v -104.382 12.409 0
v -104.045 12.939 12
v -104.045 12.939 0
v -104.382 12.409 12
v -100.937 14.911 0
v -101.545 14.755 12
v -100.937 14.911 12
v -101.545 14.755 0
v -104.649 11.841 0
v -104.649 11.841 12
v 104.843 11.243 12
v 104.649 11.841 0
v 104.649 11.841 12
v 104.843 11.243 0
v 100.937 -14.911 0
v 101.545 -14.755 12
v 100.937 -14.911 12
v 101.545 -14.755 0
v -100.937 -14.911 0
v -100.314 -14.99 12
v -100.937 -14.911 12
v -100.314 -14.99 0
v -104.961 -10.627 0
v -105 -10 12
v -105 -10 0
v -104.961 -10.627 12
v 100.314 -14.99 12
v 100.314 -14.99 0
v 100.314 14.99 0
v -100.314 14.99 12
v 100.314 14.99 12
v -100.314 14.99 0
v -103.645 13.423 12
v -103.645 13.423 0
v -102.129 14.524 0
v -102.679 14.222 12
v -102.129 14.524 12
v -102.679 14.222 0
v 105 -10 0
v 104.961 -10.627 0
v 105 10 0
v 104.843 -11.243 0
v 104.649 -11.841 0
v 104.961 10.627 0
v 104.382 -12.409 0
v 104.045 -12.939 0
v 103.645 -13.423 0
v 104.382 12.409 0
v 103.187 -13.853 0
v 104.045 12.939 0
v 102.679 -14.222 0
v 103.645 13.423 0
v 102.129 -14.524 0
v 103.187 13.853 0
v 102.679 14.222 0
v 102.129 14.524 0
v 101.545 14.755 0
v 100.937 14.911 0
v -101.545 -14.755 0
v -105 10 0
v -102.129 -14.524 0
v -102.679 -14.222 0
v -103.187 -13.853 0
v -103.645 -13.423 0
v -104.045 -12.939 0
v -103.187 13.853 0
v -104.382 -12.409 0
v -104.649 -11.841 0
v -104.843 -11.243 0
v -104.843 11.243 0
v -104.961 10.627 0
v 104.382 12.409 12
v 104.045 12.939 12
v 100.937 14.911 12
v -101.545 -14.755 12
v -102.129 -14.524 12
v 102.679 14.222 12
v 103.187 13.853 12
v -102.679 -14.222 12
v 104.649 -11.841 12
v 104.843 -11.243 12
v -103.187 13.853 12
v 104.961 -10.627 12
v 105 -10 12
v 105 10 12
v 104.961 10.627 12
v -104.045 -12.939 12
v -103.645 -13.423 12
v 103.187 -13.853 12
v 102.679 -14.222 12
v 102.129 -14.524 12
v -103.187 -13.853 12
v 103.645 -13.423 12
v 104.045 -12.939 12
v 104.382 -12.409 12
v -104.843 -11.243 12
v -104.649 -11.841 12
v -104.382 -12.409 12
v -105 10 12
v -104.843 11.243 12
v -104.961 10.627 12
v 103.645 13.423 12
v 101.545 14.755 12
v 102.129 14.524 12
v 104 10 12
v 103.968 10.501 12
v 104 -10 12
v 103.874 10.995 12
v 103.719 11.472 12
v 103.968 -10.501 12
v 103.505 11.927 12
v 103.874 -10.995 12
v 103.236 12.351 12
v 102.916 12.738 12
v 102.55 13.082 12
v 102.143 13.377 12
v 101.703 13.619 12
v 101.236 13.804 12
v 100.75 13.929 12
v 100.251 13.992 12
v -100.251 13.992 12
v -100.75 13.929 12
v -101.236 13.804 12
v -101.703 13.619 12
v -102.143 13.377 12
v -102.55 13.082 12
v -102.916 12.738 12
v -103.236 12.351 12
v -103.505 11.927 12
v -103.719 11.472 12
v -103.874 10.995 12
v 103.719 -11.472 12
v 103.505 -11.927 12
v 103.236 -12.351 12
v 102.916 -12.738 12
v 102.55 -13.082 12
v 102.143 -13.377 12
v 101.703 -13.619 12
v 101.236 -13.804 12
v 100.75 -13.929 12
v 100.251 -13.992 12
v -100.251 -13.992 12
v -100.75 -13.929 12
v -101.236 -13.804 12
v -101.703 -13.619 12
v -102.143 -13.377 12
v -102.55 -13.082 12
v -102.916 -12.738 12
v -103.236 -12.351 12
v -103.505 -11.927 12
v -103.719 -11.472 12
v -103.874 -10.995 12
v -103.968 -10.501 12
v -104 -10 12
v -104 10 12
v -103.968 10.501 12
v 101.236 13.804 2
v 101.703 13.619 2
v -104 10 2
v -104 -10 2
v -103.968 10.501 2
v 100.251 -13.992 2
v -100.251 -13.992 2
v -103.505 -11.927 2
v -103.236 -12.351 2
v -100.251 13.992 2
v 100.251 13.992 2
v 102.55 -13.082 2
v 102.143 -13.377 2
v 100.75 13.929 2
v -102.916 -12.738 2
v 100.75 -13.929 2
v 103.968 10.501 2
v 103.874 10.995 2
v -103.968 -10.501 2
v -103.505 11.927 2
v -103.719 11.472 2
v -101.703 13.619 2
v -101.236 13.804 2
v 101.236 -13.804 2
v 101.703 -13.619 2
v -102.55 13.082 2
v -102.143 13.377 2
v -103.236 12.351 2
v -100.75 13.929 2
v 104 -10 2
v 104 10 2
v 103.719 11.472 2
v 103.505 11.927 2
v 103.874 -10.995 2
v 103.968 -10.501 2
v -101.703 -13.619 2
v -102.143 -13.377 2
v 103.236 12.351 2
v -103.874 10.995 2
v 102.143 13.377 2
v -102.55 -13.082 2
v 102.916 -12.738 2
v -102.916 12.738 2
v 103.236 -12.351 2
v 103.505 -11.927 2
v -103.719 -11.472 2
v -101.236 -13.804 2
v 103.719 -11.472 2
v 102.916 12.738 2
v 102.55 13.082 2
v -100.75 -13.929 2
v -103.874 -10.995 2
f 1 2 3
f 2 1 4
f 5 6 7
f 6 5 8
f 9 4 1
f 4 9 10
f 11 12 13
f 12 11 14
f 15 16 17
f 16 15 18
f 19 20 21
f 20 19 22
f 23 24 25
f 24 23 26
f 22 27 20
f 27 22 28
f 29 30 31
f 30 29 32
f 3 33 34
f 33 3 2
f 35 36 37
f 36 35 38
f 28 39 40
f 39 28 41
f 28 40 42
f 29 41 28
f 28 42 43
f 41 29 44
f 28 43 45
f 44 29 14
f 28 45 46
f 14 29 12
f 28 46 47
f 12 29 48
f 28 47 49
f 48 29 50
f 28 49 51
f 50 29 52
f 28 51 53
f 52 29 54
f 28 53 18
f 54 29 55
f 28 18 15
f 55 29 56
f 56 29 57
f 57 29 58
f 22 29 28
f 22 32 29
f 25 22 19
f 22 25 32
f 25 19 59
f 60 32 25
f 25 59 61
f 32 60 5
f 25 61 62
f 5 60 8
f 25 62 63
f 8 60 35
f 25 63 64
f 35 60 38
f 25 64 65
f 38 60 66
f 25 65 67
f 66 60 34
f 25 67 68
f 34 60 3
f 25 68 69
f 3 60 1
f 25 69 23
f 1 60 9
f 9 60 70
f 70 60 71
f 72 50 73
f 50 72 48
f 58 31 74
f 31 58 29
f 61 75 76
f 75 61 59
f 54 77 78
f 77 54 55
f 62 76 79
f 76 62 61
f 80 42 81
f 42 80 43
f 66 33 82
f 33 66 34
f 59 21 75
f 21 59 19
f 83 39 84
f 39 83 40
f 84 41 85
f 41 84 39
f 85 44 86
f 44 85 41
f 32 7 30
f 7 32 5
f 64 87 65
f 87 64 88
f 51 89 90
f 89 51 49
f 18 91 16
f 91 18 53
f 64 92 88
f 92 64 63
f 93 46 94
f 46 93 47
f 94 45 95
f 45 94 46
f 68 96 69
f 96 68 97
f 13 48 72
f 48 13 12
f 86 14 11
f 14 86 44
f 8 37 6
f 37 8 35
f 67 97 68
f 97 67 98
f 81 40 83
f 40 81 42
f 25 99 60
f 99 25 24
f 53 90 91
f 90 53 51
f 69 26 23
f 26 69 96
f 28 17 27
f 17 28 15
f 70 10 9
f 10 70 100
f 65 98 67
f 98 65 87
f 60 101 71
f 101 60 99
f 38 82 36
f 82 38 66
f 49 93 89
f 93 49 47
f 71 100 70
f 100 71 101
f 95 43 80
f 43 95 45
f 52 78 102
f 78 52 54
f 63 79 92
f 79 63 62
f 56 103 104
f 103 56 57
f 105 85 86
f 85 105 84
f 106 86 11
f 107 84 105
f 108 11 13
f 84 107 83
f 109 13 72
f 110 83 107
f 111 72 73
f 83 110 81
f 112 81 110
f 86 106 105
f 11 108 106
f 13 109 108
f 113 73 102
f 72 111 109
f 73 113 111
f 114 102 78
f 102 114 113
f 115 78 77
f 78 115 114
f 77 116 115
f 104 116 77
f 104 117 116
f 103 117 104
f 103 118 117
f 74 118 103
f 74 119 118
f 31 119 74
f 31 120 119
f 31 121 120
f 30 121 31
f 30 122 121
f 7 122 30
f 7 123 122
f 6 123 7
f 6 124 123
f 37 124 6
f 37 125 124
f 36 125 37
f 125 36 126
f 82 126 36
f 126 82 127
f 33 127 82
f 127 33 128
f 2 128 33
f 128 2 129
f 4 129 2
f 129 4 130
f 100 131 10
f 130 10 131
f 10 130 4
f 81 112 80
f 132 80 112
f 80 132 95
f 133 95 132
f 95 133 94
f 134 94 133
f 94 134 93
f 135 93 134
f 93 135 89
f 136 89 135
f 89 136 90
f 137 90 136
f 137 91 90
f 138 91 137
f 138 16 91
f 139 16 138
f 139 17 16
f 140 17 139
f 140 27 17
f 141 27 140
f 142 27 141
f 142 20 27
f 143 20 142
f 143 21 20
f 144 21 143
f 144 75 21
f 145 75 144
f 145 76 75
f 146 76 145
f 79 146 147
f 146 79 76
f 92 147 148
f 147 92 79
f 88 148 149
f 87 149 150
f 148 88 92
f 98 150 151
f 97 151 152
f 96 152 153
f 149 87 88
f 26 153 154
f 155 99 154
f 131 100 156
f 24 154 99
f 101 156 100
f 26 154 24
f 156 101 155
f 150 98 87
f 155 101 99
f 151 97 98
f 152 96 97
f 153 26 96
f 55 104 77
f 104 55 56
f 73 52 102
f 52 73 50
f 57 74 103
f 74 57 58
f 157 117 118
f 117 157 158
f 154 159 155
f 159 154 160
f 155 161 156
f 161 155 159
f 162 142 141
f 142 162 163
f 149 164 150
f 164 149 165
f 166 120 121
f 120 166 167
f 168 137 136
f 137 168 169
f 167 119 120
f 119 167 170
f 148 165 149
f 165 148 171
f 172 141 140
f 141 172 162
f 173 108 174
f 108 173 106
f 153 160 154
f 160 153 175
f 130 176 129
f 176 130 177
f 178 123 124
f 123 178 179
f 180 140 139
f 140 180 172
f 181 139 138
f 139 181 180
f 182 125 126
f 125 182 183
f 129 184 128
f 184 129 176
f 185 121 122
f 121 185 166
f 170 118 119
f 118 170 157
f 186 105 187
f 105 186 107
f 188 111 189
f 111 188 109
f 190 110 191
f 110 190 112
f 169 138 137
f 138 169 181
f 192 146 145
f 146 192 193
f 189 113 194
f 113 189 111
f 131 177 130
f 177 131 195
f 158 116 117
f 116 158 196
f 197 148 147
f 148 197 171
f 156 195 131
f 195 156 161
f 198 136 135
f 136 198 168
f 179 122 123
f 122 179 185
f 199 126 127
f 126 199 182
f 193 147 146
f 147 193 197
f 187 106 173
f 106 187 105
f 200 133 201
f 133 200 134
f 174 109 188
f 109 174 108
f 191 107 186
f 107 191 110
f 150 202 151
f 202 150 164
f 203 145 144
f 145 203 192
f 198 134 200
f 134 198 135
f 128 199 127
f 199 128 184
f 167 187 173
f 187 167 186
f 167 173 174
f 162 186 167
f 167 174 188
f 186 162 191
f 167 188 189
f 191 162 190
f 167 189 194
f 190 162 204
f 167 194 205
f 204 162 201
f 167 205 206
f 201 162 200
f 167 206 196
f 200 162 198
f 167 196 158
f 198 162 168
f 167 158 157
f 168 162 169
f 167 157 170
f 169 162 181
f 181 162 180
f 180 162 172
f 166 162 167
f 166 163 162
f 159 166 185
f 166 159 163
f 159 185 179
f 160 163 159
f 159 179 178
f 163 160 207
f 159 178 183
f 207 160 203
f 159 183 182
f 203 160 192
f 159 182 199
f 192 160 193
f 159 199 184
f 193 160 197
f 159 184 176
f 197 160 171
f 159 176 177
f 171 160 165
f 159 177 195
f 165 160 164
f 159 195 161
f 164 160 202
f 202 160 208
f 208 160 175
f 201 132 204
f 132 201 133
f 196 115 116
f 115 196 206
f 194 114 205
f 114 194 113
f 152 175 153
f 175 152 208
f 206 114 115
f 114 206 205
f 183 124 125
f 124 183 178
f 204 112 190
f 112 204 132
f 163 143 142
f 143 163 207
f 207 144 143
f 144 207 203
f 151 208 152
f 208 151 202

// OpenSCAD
$fn = 50;


difference() {
	union() {
		hull() {
			translate(v = [-100.0000000000, 10.0000000000, 0]) {
				cylinder(h = 12, r = 5);
			}
			translate(v = [100.0000000000, 10.0000000000, 0]) {
				cylinder(h = 12, r = 5);
			}
			translate(v = [-100.0000000000, -10.0000000000, 0]) {
				cylinder(h = 12, r = 5);
			}
			translate(v = [100.0000000000, -10.0000000000, 0]) {
				cylinder(h = 12, r = 5);
			}
		}
	}
	union() {
		translate(v = [0, 0, 2]) {
			hull() {
				translate(v = [-100.0000000000, 10.0000000000, 0]) {
					cylinder(h = 10, r = 4);
				}
				translate(v = [100.0000000000, 10.0000000000, 0]) {
					cylinder(h = 10, r = 4);
				}
				translate(v = [-100.0000000000, -10.0000000000, 0]) {
					cylinder(h = 10, r = 4);
				}
				translate(v = [100.0000000000, -10.0000000000, 0]) {
					cylinder(h = 10, r = 4);
				}
			}
		}
	}
}
